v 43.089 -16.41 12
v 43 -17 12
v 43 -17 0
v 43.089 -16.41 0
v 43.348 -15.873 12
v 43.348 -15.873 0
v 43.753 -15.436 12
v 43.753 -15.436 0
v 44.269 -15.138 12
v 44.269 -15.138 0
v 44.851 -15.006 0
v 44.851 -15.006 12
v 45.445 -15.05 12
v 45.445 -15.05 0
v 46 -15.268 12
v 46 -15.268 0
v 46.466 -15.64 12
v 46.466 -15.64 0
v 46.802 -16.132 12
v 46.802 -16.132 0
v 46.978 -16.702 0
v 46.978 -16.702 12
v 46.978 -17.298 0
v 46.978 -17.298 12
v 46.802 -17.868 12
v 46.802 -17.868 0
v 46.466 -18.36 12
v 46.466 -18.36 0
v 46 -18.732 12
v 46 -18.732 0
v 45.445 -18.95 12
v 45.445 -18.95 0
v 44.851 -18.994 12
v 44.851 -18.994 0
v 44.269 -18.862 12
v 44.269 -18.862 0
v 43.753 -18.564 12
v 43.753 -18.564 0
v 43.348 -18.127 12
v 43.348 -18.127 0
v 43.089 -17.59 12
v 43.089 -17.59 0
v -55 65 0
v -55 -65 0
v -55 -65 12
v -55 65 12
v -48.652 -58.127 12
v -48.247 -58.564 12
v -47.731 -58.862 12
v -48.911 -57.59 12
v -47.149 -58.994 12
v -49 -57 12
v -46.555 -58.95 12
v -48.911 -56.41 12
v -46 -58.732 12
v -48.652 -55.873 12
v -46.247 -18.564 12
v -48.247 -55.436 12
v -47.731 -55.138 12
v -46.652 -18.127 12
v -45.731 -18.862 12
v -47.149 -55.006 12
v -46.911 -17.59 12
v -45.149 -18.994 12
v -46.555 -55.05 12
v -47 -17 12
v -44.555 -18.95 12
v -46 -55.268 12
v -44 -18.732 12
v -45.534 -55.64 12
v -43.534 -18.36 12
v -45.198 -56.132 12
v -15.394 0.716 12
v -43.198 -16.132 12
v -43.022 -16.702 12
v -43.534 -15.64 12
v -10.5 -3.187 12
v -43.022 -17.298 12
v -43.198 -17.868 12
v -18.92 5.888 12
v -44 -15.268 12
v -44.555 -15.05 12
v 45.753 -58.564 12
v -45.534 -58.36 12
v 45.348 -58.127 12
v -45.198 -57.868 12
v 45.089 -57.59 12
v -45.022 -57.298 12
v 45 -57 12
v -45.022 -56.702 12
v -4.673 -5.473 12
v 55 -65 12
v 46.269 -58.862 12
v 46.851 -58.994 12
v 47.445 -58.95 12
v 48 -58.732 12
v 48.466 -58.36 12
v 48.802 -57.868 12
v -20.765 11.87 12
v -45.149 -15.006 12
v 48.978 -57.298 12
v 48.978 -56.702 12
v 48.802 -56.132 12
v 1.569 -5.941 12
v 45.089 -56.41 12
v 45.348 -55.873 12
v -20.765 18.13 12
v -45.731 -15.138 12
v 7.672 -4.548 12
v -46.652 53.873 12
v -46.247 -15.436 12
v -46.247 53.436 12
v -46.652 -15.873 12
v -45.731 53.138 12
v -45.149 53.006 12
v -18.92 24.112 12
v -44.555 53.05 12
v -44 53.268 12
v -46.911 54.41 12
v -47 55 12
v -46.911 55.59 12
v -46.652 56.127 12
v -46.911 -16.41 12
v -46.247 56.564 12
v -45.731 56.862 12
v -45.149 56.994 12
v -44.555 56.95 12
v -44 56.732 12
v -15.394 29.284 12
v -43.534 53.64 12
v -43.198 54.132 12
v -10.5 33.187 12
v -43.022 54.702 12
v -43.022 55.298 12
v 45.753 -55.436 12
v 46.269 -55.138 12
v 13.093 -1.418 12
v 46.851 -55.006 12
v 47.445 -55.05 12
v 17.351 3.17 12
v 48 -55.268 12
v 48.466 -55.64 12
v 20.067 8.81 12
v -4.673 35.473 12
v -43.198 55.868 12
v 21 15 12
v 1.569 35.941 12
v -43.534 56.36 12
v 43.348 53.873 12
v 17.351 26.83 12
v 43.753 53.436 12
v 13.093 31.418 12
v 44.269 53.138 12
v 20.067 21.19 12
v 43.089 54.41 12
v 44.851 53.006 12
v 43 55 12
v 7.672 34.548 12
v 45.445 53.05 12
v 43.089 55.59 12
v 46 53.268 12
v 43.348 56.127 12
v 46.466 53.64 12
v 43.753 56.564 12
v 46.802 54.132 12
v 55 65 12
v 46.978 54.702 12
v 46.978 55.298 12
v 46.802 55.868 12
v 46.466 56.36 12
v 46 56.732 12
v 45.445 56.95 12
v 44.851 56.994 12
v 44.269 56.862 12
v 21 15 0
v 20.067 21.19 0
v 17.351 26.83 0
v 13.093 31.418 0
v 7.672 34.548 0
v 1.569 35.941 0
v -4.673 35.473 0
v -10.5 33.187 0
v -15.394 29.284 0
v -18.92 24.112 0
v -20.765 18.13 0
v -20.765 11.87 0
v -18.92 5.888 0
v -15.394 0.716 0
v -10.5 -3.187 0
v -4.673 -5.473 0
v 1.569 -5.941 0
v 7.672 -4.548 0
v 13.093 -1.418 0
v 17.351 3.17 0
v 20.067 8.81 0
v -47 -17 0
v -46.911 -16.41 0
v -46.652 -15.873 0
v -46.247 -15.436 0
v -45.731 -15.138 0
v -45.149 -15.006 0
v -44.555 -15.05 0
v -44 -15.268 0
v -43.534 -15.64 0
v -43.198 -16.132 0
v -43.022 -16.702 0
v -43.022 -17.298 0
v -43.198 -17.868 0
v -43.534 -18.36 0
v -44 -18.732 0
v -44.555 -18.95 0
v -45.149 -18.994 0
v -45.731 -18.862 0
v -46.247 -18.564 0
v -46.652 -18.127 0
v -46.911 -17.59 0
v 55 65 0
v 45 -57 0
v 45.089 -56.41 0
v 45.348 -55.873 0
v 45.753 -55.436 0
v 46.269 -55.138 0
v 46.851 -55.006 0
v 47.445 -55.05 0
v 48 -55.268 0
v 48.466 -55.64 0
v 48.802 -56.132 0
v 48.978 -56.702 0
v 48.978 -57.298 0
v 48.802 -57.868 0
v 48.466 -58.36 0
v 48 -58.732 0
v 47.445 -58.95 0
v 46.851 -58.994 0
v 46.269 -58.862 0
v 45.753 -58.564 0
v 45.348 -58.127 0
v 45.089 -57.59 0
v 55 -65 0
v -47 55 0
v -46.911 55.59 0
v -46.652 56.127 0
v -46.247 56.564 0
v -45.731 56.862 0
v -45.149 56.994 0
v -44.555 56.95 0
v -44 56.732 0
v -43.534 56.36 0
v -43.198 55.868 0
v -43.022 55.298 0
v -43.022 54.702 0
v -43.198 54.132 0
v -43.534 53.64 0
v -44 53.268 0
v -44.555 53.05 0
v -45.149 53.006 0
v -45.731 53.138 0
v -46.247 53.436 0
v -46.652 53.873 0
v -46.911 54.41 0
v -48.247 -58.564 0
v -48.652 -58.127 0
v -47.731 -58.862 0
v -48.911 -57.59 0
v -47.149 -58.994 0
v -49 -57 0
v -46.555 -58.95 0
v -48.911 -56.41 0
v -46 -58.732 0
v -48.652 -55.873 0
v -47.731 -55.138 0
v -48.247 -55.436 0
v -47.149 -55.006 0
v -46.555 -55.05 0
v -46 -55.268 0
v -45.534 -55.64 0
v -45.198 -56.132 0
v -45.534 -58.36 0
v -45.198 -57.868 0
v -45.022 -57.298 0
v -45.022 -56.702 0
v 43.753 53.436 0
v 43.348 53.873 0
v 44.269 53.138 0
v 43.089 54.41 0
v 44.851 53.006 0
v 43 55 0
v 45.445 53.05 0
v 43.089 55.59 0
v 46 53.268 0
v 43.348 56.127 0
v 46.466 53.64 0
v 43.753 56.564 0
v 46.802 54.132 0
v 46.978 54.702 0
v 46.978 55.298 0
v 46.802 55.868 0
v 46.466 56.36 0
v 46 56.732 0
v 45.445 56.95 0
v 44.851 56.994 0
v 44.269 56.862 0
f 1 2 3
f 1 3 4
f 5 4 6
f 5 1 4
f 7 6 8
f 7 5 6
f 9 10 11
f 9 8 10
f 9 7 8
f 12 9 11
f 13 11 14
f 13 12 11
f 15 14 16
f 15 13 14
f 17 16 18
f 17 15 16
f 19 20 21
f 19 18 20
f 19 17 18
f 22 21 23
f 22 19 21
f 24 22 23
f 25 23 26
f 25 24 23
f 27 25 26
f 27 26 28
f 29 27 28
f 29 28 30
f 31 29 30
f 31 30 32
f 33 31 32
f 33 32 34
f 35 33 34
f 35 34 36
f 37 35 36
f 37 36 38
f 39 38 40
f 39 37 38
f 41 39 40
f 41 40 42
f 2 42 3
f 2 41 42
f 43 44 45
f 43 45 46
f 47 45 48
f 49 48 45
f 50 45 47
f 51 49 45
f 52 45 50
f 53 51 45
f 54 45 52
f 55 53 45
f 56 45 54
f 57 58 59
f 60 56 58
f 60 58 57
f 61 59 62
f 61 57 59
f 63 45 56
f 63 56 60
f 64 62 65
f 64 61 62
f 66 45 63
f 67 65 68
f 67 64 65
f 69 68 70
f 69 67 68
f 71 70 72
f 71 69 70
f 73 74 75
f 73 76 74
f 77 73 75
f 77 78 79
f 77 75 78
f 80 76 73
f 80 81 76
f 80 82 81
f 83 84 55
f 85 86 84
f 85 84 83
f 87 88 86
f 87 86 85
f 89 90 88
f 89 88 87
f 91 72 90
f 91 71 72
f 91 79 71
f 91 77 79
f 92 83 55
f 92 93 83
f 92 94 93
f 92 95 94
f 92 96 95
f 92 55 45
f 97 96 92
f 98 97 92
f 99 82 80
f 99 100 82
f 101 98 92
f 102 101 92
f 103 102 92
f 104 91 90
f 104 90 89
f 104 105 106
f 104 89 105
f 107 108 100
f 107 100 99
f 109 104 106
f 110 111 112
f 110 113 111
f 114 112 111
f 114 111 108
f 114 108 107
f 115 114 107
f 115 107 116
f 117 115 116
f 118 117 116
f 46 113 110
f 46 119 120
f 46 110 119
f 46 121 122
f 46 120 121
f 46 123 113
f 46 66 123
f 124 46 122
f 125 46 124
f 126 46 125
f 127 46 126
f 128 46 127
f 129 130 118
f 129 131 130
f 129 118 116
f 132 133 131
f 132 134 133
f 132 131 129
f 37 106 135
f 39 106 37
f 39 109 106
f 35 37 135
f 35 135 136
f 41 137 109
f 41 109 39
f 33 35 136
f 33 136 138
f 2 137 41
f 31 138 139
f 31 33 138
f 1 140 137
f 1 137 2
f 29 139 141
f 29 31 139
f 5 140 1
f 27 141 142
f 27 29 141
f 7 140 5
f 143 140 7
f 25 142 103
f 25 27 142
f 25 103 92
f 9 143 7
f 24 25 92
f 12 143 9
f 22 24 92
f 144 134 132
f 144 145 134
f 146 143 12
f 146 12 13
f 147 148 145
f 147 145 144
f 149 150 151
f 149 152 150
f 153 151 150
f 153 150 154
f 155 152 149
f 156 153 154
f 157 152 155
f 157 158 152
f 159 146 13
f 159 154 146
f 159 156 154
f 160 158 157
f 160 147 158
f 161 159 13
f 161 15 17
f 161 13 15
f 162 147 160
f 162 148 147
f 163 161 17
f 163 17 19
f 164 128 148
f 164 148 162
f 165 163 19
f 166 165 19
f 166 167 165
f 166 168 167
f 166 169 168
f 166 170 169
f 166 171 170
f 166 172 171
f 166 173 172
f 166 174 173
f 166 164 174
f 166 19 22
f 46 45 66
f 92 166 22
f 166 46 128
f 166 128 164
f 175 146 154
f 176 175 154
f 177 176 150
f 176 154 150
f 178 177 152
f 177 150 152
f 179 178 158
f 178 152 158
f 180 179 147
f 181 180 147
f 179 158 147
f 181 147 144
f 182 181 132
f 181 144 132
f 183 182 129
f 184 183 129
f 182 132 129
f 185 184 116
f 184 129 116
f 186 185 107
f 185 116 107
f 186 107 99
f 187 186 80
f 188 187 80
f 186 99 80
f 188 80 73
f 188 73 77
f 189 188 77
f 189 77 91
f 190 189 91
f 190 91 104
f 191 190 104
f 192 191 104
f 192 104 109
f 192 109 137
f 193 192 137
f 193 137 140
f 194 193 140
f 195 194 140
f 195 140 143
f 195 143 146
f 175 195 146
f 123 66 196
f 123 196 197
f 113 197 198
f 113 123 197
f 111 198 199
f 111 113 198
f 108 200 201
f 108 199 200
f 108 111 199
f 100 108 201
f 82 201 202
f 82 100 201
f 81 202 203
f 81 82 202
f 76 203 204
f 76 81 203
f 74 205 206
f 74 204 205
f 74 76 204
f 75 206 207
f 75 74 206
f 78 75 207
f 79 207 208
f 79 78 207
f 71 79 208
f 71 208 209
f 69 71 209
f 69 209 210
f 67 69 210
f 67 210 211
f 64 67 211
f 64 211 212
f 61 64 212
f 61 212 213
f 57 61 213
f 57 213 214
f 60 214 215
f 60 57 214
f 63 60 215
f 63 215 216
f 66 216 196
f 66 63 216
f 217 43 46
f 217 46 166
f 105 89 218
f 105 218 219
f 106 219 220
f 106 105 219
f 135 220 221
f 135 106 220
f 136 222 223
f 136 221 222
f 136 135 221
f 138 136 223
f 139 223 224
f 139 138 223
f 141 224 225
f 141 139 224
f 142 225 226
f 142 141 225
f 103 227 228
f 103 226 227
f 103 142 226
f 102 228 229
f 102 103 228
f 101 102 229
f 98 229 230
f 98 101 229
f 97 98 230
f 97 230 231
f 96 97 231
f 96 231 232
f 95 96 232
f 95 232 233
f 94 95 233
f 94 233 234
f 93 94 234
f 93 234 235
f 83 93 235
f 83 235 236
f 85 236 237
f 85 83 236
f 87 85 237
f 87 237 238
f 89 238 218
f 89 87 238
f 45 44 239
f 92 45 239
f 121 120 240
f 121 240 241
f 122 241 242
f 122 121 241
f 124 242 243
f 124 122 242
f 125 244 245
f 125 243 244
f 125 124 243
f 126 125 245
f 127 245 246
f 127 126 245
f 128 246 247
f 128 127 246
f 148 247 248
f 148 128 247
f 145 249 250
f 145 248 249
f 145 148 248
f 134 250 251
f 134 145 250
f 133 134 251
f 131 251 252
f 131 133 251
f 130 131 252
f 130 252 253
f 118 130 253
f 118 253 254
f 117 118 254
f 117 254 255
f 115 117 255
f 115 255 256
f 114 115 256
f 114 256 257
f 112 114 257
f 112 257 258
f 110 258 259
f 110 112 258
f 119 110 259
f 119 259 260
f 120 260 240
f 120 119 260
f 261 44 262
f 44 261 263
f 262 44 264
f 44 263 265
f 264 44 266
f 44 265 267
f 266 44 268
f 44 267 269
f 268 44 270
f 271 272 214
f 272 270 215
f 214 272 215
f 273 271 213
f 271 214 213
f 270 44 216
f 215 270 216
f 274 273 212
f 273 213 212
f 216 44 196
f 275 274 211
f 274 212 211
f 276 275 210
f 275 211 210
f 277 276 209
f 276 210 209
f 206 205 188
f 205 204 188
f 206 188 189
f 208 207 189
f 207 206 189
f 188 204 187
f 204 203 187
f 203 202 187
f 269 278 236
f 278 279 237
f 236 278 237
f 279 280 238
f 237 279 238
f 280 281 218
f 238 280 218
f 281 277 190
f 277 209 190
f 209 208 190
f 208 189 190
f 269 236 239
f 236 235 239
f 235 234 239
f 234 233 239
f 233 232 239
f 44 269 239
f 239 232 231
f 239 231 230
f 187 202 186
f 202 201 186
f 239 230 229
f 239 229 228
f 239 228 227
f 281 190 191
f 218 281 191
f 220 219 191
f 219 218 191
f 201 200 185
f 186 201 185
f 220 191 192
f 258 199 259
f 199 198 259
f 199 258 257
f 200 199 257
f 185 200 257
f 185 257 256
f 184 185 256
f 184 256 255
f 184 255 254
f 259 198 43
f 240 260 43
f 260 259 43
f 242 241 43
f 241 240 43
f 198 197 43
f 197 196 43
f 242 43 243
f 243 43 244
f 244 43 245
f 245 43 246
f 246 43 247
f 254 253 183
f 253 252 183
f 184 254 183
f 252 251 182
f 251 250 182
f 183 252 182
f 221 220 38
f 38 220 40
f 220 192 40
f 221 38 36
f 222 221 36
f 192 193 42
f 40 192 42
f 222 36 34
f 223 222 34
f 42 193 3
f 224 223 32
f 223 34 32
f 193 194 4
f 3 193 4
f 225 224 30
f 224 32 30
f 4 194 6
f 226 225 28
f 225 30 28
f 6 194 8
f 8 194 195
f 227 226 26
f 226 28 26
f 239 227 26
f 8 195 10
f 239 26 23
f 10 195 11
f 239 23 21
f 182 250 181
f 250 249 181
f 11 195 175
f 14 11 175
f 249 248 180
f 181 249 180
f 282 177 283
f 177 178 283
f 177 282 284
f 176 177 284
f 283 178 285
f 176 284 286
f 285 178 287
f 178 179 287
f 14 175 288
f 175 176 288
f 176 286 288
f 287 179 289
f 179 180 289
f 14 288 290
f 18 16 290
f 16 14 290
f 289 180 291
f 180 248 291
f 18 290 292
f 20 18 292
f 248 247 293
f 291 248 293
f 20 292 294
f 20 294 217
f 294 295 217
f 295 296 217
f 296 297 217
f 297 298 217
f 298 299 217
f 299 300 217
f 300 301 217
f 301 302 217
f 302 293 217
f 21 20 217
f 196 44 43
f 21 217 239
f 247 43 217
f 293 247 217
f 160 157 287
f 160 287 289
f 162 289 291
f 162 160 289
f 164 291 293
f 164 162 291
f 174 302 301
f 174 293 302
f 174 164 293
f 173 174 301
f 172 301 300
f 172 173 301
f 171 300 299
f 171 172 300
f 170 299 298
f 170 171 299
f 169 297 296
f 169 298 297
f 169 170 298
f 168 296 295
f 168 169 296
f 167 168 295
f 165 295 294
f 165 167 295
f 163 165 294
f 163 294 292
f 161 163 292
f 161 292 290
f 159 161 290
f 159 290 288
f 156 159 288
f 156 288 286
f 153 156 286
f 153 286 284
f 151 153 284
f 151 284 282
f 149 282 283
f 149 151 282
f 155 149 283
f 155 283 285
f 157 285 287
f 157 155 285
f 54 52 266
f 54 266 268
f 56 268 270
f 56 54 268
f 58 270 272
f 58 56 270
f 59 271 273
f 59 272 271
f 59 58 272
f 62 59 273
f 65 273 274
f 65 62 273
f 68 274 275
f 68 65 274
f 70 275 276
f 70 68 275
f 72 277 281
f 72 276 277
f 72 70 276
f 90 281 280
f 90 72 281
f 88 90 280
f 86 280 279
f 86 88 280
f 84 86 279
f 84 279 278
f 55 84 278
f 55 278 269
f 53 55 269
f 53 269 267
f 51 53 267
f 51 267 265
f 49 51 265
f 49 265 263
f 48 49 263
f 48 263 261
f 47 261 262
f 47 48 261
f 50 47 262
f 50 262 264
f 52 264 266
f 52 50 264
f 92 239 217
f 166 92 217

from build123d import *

# Parameters (mm, degrees)
SKETCH1_W               = 110
SKETCH1_H               = 130
BOSS_EXTRUDE1_DEPTH     = 12
CUT_EXTRUDE1_DEPTH      = 86.988371307
CUT_EXTRUDE1_DEPTH_BACK = 86.988371307
SKETCH2_R               = 2
SKETCH3_R               = 21
CUT_EXTRUDE2_DEPTH      = 86.988371307


with BuildPart() as part:
    # Sketch1 → Boss-Extrude1 (new body)
    with BuildSketch(Plane.XY):
        Rectangle(SKETCH1_W, SKETCH1_H)
    extrude(amount=BOSS_EXTRUDE1_DEPTH)

    # Sketch2 → Cut-Extrude1 (cut, two sides: drawn at the far end of the back side and taken through both)
    with BuildSketch(Plane(origin=(0, 0, 0), x_dir=(-1, 0, 0), z_dir=(0, 0, -1)).offset(-CUT_EXTRUDE1_DEPTH_BACK)):
        with Locations((-45, 55)):
            Circle(SKETCH2_R)
        with Locations((-45, -17)):
            Circle(SKETCH2_R)
        with Locations((-47, -57)):
            Circle(SKETCH2_R)
        with Locations((47, -57)):
            Circle(SKETCH2_R)
        with Locations((45, -17)):
            Circle(SKETCH2_R)
        with Locations((45, 55)):
            Circle(SKETCH2_R)
    extrude(amount=CUT_EXTRUDE1_DEPTH + CUT_EXTRUDE1_DEPTH_BACK, mode=Mode.SUBTRACT)

    # Sketch3 → Cut-Extrude2 (cut, through all)
    with BuildSketch(Plane.XY.offset(12)):
        with Locations((0, 15)):
            Circle(SKETCH3_R)
    extrude(amount=-CUT_EXTRUDE2_DEPTH, mode=Mode.SUBTRACT)


solid = part.part
